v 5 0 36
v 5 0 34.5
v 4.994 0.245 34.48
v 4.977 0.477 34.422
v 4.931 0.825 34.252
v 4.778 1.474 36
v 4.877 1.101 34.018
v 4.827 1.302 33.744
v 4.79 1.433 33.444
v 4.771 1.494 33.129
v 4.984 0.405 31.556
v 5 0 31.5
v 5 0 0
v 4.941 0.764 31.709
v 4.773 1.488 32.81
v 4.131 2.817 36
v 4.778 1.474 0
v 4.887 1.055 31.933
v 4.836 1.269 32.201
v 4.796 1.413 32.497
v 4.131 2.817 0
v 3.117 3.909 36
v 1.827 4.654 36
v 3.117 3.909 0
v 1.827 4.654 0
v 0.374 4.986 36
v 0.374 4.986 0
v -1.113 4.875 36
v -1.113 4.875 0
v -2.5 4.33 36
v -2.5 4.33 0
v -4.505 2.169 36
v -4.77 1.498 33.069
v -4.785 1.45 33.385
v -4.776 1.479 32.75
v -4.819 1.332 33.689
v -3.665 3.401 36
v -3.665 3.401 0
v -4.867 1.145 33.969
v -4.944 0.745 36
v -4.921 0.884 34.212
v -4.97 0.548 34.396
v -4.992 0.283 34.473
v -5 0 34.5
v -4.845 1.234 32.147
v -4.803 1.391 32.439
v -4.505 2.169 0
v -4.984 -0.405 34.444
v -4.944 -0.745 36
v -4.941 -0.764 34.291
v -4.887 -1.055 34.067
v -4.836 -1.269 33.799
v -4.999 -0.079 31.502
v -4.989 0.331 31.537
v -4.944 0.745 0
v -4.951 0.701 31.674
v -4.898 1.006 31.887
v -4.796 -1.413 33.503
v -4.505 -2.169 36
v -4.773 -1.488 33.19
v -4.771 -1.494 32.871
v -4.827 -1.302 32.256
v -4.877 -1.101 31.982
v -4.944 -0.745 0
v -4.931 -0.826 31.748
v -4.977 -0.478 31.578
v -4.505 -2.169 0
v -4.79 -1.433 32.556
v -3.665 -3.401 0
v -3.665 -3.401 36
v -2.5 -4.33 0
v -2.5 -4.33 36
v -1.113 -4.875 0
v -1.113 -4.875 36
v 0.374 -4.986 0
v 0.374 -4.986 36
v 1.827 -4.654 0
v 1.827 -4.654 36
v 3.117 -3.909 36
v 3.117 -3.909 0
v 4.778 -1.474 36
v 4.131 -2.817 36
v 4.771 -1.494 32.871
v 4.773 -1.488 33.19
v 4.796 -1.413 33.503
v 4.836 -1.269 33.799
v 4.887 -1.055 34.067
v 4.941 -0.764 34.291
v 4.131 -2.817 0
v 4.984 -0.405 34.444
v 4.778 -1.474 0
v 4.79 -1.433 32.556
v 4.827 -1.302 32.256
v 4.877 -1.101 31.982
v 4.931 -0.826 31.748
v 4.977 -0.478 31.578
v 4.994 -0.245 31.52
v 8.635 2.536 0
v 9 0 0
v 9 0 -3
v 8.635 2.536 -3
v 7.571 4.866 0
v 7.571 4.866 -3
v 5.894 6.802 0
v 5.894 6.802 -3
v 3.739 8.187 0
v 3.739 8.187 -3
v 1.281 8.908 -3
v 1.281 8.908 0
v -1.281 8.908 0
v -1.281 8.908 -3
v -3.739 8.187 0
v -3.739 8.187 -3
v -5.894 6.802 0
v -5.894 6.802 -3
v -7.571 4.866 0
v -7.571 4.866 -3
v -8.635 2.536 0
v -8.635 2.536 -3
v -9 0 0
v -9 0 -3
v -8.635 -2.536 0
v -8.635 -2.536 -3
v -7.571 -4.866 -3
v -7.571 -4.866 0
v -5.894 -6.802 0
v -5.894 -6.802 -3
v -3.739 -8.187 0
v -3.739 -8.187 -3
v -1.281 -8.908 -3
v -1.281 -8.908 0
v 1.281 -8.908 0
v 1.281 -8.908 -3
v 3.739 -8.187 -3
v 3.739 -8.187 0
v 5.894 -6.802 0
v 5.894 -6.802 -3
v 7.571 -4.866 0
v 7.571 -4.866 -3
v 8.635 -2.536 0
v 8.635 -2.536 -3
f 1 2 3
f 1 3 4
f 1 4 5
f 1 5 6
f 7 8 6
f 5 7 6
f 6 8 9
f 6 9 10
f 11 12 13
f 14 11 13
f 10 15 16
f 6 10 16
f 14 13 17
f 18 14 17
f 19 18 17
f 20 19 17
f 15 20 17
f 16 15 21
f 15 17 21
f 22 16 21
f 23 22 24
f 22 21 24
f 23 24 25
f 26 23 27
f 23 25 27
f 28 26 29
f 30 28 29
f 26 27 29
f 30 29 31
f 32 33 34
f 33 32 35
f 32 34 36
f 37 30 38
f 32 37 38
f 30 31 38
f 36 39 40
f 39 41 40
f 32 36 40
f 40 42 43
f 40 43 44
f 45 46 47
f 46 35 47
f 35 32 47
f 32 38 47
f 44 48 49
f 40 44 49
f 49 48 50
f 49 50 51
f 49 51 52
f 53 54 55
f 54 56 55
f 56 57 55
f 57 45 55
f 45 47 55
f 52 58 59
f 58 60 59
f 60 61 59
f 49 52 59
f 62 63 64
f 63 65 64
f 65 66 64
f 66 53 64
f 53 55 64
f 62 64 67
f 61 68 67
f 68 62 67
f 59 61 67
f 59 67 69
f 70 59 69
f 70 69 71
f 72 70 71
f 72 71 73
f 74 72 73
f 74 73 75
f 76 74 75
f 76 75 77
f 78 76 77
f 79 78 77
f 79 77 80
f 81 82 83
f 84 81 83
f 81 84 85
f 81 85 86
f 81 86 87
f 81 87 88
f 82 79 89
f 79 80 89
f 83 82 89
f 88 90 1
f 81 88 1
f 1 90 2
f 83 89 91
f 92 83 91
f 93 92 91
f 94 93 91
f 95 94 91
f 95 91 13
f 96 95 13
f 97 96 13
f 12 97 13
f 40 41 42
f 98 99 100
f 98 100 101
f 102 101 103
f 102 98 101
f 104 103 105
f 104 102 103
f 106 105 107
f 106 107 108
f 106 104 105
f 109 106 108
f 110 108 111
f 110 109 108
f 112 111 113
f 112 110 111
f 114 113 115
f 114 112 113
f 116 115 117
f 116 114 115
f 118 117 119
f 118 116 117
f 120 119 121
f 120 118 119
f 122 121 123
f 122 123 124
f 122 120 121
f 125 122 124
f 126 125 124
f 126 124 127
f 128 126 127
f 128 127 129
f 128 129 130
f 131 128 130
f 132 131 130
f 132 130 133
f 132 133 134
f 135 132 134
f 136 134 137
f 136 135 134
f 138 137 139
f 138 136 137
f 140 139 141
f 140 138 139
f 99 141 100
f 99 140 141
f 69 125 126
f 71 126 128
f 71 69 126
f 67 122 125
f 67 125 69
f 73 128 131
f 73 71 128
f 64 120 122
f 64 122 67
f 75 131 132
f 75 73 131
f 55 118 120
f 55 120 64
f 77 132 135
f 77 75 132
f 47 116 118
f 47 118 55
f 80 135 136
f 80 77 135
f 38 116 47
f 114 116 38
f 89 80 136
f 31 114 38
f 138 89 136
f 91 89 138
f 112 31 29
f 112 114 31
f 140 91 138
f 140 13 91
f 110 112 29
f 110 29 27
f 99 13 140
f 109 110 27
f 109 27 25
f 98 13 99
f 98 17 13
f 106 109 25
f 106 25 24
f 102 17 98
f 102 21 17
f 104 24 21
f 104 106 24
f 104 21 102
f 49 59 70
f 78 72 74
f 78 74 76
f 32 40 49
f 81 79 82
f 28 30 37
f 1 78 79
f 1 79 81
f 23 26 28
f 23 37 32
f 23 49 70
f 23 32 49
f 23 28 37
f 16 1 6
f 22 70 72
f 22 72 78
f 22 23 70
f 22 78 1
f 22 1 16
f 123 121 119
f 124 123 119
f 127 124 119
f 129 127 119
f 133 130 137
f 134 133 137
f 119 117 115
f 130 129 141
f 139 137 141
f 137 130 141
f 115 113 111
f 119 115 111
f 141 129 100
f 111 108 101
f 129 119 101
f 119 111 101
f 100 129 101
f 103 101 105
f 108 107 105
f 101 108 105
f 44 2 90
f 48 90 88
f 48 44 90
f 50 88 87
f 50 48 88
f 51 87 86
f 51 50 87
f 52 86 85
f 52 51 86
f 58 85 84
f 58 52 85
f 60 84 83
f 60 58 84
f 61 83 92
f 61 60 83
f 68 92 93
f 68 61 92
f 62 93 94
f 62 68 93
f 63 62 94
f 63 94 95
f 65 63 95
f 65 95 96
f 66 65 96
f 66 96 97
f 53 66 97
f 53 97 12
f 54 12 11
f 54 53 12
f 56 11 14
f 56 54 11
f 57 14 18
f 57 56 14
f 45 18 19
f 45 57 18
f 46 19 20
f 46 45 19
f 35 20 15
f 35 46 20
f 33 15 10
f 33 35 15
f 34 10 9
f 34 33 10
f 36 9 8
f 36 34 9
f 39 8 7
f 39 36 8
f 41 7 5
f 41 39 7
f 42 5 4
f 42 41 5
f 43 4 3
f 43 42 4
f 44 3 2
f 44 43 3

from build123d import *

# Parameters (mm, degrees)
SKETCH1_R               = 5
BOSS_EXTRUDE1_DEPTH     = 36
SKETCH2_R               = 9
BOSS_EXTRUDE2_DEPTH     = 3
CUT_EXTRUDE1_DEPTH      = 39.183766184
CUT_EXTRUDE1_DEPTH_BACK = 39.183766184
SKETCH3_R               = 1.5


with BuildPart() as part:
    # Sketch1 → Boss-Extrude1 (new body)
    with BuildSketch(Plane.XY):
        Circle(SKETCH1_R)
    extrude(amount=BOSS_EXTRUDE1_DEPTH)

    # Sketch2 → Boss-Extrude2 (add)
    with BuildSketch(Plane.XY):
        Circle(SKETCH2_R)
    extrude(amount=-BOSS_EXTRUDE2_DEPTH)

    # Sketch3 → Cut-Extrude1 (cut, two sides: drawn at the far end of the back side and taken through both)
    with BuildSketch(Plane(origin=(0, 0, 0), x_dir=(0, 0, -1), z_dir=(1, 0, 0)).offset(-CUT_EXTRUDE1_DEPTH_BACK)):
        with Locations(Location((-33, 0, 0), (0, 0, 179.999999999))):
            Circle(SKETCH3_R)
    extrude(amount=CUT_EXTRUDE1_DEPTH + CUT_EXTRUDE1_DEPTH_BACK, mode=Mode.SUBTRACT)


solid = part.part
